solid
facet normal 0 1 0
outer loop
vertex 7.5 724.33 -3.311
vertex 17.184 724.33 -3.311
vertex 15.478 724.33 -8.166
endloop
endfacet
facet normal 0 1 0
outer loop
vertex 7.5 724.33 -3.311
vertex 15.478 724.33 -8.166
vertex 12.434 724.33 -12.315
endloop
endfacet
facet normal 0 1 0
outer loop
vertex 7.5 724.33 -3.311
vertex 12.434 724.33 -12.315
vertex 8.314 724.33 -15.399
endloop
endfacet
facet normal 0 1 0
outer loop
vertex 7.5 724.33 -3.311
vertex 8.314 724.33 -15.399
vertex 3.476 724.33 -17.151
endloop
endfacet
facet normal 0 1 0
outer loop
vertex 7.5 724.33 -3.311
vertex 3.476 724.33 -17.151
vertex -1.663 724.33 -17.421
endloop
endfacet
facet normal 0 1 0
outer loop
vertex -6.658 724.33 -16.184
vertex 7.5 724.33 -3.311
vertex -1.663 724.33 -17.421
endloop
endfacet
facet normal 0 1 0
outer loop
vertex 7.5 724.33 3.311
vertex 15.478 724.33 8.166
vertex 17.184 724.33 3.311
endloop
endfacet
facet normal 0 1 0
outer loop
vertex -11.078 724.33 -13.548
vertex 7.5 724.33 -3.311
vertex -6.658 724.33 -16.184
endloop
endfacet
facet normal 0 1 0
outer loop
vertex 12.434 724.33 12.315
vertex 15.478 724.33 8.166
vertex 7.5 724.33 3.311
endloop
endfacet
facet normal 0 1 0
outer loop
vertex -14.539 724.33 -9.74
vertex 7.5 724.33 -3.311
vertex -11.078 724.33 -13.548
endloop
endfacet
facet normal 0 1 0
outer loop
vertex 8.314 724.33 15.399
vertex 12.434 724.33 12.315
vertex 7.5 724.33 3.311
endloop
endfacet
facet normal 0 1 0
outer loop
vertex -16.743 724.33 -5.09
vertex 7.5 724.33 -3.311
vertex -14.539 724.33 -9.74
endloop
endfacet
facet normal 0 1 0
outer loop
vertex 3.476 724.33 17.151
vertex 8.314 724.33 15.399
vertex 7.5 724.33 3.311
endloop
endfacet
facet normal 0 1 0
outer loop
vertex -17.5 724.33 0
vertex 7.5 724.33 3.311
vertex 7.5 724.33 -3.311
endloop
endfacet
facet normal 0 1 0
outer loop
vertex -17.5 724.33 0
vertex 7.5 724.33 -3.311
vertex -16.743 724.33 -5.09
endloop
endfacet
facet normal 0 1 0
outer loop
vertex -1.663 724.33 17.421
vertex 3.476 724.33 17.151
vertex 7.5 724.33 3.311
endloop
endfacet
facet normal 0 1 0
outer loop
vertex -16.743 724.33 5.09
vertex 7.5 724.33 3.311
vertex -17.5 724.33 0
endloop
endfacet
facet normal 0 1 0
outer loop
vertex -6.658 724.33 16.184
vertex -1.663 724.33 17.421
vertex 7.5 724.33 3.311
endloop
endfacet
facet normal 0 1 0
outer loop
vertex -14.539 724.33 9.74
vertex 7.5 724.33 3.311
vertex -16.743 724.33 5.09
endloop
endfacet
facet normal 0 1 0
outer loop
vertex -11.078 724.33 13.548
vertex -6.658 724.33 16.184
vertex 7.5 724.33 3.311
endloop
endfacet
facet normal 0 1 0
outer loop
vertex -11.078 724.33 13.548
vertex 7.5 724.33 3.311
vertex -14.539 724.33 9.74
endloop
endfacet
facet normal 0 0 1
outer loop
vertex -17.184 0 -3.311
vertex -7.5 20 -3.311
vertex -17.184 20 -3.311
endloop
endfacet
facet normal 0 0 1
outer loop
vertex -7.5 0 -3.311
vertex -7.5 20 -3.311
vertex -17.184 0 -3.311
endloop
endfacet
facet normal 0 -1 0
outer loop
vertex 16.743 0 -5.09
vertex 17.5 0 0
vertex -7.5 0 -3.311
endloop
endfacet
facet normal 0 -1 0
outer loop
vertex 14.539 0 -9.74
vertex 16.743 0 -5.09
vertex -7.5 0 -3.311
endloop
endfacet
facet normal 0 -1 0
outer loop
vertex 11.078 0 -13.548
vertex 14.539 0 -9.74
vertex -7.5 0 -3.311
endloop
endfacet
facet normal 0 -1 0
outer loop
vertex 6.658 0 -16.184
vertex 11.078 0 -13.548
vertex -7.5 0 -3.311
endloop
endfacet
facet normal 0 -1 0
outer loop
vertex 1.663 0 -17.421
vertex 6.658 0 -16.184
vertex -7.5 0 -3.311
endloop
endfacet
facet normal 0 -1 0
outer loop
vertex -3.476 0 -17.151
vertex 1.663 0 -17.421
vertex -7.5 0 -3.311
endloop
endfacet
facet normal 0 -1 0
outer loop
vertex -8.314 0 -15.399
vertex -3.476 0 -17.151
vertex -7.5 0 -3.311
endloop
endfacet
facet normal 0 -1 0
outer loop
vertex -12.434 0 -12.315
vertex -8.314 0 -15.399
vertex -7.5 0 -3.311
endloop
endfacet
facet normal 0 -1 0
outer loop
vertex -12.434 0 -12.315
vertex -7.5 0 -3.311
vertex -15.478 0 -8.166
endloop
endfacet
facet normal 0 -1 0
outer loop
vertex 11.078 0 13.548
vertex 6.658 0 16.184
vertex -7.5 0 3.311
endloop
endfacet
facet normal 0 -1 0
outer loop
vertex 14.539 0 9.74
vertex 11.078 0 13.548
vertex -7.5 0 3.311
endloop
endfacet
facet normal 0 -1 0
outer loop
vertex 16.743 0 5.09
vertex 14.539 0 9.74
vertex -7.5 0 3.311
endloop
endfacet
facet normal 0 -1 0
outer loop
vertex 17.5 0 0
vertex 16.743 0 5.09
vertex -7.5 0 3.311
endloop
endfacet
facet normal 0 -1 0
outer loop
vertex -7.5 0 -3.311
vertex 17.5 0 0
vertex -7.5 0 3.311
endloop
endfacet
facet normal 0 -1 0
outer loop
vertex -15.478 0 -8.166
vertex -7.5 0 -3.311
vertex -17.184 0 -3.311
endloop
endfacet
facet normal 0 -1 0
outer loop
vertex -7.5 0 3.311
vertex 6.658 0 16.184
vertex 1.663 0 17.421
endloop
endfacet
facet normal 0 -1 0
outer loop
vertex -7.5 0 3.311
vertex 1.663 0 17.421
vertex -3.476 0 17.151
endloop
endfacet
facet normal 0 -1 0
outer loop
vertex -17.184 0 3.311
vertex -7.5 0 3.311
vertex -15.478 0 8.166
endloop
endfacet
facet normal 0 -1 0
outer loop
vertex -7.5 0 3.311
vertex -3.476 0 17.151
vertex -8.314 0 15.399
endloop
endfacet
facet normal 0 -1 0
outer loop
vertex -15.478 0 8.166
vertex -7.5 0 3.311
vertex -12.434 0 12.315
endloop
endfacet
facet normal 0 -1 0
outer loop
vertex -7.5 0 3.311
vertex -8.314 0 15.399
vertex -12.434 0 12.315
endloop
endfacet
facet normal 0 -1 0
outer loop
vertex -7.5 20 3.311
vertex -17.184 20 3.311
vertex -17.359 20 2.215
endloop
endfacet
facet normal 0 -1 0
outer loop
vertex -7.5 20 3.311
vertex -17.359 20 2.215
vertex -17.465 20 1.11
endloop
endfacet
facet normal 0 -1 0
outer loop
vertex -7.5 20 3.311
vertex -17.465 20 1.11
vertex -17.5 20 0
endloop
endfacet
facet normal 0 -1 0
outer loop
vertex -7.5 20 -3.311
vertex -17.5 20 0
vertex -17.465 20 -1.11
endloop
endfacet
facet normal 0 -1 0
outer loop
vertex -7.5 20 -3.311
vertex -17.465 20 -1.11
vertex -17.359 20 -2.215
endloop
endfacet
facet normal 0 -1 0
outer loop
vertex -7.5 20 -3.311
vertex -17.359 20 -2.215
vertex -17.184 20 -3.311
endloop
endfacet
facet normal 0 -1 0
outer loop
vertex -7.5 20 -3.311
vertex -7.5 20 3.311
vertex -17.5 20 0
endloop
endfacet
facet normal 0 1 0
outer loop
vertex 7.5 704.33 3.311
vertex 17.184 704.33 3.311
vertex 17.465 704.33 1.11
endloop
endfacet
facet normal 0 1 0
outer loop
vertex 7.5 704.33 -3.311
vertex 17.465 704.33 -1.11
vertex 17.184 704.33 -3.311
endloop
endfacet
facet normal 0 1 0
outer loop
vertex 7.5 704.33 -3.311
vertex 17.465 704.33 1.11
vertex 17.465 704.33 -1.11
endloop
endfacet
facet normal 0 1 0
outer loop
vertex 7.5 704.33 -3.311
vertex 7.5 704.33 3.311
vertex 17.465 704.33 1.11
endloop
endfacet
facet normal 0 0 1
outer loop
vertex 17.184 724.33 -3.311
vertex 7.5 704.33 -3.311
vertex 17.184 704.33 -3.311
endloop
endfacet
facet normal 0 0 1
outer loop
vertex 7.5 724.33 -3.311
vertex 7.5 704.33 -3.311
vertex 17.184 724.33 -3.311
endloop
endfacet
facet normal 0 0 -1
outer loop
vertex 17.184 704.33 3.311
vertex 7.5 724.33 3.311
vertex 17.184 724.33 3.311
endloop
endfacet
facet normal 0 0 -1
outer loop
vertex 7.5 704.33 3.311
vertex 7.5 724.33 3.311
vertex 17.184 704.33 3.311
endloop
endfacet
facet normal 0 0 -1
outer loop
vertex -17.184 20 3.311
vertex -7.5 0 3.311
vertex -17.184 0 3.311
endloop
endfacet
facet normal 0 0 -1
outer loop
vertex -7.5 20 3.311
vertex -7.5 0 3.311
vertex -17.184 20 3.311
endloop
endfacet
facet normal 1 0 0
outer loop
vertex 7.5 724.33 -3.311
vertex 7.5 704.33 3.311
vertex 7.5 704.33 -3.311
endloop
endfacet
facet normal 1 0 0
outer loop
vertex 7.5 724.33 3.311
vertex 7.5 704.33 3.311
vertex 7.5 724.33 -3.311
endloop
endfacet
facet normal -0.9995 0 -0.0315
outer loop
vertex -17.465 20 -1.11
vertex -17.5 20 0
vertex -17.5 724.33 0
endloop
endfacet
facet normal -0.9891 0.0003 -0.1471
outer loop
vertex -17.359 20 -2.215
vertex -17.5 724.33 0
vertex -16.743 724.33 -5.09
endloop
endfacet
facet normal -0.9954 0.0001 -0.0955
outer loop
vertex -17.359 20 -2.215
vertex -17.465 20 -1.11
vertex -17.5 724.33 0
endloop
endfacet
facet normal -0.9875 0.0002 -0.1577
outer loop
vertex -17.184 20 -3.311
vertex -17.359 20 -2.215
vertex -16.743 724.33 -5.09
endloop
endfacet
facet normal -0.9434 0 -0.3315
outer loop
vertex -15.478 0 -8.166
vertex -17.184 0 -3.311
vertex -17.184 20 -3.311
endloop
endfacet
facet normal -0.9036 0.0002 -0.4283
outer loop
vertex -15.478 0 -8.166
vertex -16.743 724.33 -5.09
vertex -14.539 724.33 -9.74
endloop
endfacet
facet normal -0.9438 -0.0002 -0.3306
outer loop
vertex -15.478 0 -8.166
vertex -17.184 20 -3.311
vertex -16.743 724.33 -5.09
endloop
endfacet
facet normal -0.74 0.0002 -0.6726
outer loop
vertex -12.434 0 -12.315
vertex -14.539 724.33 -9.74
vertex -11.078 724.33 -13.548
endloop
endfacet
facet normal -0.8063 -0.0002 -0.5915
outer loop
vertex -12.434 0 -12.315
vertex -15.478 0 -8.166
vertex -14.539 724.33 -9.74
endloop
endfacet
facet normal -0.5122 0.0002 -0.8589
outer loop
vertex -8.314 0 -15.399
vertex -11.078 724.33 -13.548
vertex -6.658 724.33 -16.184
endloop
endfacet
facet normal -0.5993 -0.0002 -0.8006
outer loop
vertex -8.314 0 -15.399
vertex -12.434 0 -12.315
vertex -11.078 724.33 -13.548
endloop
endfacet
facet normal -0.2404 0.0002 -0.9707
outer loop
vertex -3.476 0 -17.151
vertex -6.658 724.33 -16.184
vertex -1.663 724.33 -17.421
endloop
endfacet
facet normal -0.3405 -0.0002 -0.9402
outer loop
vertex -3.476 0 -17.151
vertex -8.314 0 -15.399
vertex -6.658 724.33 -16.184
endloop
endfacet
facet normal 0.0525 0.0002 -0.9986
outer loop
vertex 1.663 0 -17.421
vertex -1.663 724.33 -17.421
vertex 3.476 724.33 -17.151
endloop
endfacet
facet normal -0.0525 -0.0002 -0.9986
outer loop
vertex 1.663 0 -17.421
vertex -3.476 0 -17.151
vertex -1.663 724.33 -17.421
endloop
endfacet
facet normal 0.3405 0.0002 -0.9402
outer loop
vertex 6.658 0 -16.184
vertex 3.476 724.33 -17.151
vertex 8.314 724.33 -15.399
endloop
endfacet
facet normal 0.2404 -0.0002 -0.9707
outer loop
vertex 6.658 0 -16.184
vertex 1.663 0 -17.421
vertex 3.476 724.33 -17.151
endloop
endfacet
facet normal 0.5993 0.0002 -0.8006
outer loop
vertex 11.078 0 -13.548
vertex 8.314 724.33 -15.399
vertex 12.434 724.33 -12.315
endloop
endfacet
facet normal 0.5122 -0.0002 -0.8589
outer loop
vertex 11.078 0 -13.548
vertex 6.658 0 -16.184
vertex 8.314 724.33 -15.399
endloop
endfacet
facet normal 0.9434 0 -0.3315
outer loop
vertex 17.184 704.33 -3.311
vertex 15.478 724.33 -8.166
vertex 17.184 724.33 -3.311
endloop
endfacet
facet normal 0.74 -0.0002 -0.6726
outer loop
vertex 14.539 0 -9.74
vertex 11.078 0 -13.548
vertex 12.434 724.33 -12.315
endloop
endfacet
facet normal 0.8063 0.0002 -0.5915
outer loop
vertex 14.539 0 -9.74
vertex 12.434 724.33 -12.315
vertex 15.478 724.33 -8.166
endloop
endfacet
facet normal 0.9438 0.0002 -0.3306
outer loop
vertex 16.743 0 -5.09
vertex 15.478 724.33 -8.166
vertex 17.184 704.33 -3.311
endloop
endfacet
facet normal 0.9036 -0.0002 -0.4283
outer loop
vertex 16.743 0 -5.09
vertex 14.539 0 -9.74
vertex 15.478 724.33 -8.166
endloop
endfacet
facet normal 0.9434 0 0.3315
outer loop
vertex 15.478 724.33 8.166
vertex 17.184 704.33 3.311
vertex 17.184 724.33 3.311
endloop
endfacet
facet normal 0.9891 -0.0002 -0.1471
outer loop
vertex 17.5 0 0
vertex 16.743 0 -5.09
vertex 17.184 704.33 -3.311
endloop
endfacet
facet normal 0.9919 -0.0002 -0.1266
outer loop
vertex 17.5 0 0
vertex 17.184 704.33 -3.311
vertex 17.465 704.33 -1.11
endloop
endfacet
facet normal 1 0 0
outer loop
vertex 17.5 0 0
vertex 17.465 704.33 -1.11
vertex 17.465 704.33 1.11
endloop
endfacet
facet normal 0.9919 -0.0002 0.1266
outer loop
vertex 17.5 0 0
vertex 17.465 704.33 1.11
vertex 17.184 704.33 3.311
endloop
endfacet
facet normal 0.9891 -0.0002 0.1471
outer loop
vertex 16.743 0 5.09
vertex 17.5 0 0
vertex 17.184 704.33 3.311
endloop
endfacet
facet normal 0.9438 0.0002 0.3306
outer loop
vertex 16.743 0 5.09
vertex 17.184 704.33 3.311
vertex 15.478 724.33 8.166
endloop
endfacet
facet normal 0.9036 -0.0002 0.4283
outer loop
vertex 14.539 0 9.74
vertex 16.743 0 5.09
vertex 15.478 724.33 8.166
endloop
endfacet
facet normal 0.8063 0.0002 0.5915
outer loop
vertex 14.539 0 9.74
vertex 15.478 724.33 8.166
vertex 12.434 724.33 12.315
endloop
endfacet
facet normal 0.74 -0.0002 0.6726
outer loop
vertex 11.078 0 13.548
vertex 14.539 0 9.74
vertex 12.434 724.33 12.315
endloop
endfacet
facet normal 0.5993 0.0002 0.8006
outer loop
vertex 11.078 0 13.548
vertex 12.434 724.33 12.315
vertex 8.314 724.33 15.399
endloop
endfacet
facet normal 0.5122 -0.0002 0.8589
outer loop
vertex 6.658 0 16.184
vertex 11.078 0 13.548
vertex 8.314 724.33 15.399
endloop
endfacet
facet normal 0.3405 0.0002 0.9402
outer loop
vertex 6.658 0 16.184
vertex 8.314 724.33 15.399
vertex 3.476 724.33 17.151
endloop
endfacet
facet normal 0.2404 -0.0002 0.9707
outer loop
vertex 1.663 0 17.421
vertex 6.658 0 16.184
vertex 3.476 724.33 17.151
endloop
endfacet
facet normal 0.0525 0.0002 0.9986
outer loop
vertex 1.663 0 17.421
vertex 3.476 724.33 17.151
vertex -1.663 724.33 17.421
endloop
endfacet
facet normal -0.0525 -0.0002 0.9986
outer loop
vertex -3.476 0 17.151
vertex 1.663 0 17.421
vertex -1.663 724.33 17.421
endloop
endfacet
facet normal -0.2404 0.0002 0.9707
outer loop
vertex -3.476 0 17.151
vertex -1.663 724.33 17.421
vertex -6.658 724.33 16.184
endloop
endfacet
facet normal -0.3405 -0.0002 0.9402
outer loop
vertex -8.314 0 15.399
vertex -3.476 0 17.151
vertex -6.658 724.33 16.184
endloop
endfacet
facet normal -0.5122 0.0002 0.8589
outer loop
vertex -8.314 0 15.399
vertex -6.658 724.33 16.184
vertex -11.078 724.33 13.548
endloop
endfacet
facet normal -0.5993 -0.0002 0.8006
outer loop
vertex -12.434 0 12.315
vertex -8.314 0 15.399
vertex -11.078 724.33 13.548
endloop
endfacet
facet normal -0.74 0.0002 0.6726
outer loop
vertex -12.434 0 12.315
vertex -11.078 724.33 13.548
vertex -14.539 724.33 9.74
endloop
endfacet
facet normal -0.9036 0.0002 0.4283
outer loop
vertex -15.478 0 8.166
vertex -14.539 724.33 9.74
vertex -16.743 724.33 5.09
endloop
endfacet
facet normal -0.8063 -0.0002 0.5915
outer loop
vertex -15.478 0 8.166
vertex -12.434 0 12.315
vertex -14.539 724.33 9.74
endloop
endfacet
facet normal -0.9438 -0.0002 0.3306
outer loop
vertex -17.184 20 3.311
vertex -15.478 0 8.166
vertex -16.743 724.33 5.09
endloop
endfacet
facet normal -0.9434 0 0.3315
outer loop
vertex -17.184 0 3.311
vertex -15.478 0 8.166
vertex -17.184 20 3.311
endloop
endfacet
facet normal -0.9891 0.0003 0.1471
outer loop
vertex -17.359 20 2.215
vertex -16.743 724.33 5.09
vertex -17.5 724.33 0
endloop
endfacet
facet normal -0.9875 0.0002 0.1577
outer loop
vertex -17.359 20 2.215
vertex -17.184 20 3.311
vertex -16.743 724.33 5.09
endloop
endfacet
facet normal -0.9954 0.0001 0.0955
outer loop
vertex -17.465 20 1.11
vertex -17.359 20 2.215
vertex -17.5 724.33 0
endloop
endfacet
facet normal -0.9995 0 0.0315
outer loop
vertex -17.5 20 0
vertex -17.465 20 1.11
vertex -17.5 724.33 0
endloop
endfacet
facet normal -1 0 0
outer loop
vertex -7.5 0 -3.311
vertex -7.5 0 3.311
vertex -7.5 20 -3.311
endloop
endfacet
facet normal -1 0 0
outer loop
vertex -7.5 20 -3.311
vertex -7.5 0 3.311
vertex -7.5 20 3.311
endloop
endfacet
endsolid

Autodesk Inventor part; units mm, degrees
ref_plane "XZ Plane" through (0, 0, 0) normal (0, 1, 0) x (-1, 0, 0)
sketch "Skizze1" plane through (0, 0, 0) normal (0, 1, 0) x (-1, 0, 0)
  circle A0 centre (0, 0) radius 17.5
  dimension "d0" = 35
extrude "Extrusion1" add sketch "Skizze1" along normal blind 724.33
ref_plane "Arbeitsebene1" through (-7.5, 0, 0) normal (1, 0, 0) x (0, 1, 0)
sketch "Skizze2" plane through (-7.5, 0, 0) normal (1, 0, 0) x (0, 1, 0)
  line L0 (0, 0) -> (0, 3.311)
  line L1 (0, -17.5) -> (0, 17.5) construction
  line L2 (0, 0) -> (0, -3.311)
  line L3 (0, 3.311) -> (20, 3.311)
  line L4 (20, 3.311) -> (20, -3.311)
  line L5 (20, -3.311) -> (0, -3.311)
  line L6 (0, -3.311) -> (0, 3.311)
  dimension "d4" = 3.311
  dimension "d5" = 3.311
  dimension "d6" = 20
extrude "Extrusion2" cut sketch "Skizze2" against normal blind 724.33
ref_plane "Arbeitsebene2" through (7.5, 0, 0) normal (1, 0, 0) x (0, 1, 0)
sketch "Skizze3" plane through (7.5, 0, 0) normal (1, 0, 0) x (0, 1, 0)
  line L0 (724.33, -17.5) -> (724.33, 17.5) construction
  line L1 (724.33, 0) -> (724.33, 3.311)
  line L2 (724.33, 0) -> (724.33, -3.311)
  line L3 (724.33, 3.311) -> (704.33, 3.311)
  line L4 (704.33, 3.311) -> (704.33, -3.311)
  line L5 (704.33, -3.311) -> (724.33, -3.311)
  line L6 (724.33, -3.311) -> (724.33, 3.311)
  point P0 (0, 0)
  dimension "d10" = 3.311
  dimension "d11" = 3.311
  dimension "d12" = 20
extrude "Extrusion3" cut sketch "Skizze3" along normal blind 724.33
equation "\"d0\" = Wellensdurchmesser"
equation "\"d7\" = Wellenlänge"
equation "\"d13\" = Wellenlänge"
equation "\"Wellensdurchmesser\" = 35"
equation "\"Wellenlänge\" = 724.33"
properties part number "Welle"
